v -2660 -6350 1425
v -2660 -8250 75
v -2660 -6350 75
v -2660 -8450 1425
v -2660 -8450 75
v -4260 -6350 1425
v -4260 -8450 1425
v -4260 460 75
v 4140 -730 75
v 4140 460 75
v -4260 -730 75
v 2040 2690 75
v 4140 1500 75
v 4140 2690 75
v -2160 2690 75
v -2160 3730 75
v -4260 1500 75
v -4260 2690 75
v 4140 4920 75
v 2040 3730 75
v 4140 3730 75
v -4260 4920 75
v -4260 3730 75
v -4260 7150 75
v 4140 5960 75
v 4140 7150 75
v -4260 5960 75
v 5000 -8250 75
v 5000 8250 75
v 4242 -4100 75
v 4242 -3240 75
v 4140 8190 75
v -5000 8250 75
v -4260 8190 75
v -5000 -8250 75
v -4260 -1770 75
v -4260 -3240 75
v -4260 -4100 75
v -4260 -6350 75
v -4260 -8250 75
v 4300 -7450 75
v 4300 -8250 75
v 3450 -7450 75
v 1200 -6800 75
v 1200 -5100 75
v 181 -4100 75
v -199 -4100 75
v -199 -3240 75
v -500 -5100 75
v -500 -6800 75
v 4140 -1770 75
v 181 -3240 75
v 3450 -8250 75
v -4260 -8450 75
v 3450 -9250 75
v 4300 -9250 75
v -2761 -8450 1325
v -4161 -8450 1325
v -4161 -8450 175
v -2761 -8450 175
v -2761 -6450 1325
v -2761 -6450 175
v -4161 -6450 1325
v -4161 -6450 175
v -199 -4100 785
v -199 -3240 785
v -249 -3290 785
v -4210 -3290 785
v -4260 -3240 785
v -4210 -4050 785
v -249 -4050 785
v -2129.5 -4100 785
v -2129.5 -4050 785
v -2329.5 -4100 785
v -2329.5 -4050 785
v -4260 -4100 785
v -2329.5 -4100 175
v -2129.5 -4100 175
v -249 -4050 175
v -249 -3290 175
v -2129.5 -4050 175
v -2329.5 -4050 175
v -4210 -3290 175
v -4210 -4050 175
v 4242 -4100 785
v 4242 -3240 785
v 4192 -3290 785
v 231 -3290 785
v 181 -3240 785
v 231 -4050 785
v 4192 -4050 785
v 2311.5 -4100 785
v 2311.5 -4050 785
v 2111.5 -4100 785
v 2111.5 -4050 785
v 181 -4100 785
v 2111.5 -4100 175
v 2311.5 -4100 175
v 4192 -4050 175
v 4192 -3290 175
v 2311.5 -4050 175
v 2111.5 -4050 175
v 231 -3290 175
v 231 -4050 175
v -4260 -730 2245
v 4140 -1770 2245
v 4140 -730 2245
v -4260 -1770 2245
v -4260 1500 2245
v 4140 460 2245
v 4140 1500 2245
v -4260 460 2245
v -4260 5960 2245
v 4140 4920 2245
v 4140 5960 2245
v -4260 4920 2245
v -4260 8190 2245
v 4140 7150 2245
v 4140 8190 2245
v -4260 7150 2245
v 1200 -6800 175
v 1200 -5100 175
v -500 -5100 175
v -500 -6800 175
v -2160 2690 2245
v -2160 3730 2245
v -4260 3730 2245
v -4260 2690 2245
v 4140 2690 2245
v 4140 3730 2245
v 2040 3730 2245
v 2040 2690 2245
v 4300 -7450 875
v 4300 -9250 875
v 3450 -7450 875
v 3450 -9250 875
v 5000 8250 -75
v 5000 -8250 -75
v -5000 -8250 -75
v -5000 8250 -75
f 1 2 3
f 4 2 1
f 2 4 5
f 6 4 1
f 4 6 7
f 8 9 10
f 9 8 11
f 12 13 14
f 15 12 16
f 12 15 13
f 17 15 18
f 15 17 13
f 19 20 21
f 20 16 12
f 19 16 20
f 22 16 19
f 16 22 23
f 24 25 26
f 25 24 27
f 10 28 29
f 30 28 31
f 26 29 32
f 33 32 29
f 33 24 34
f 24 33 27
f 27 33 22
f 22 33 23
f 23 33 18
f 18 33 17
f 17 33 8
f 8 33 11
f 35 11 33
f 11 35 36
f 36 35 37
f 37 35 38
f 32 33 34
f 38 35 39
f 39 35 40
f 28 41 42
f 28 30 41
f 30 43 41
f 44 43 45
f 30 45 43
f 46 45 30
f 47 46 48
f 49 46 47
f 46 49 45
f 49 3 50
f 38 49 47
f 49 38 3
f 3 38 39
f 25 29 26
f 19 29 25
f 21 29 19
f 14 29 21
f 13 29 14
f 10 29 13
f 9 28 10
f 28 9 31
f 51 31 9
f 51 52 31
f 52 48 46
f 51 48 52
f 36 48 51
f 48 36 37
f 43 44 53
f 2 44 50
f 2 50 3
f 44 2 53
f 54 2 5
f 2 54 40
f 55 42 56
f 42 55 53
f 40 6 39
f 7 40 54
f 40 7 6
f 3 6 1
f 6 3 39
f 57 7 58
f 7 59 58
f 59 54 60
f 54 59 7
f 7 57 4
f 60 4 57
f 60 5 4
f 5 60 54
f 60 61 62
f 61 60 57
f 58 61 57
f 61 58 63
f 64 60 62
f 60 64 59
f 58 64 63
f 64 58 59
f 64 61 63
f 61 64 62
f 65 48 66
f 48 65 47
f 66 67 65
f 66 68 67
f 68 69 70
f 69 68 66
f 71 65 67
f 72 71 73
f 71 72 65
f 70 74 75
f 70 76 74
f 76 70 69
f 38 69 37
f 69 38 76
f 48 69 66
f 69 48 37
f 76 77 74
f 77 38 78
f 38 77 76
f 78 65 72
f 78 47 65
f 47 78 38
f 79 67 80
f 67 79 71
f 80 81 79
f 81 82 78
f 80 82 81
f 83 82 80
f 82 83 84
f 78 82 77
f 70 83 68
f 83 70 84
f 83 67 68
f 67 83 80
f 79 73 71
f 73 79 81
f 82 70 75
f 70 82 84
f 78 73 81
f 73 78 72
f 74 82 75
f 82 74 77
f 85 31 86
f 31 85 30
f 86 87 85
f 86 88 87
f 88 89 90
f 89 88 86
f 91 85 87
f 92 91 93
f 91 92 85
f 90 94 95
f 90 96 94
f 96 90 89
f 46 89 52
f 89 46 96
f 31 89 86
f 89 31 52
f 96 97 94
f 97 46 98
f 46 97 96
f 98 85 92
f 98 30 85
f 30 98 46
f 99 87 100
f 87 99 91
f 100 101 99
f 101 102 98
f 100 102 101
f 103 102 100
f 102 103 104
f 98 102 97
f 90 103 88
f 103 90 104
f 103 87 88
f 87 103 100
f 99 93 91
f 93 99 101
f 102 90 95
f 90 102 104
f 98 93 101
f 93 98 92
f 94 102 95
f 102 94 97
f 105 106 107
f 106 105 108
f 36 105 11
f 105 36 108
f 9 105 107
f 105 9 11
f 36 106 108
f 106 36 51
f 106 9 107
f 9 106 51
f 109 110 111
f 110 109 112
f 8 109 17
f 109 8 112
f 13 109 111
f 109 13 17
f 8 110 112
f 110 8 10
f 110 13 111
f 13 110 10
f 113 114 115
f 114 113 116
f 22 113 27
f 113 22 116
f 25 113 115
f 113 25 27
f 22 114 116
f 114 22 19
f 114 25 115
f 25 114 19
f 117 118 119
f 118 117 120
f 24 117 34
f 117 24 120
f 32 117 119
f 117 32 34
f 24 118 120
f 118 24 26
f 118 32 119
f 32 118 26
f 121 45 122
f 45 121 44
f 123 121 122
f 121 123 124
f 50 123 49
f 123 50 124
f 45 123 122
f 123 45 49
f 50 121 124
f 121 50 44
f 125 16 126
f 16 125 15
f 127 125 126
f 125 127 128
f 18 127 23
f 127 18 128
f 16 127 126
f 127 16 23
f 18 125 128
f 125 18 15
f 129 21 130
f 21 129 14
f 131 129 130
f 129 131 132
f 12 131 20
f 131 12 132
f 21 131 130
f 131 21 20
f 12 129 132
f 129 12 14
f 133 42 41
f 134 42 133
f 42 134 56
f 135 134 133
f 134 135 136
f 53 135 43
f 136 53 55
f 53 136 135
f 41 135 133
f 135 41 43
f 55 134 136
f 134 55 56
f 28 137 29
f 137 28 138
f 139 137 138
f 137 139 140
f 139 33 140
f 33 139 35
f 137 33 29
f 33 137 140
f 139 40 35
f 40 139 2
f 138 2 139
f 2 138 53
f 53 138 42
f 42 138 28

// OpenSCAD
// file: Ports.scad
function W_RJ45() = 1600;

module Port_RJ45() {
  w = W_RJ45();
  l = 2100;
  h = 1350;

  difference() {
    cube([w, l, h]);
    translate([100 - 1, -100, 100]) cube([w - 200, l, h - 200]);
  }
}
// main file
use <Ports.scad>;

function W_MESA() = 10000;
function L_MESA() = 16500;
function H_MESA() = 3000;

module Mesa7i76e_Terminal(i, j, c="#ada") {
  w_terminal = 2100;
  l_terminal = 1040;
  h_terminal = 2170;
  o_terminal = 1190;

  translate([740 + j * w_terminal, 6480 + (l_terminal + o_terminal) * i, 0]) {
    color(c) cube([w_terminal, l_terminal, h_terminal]);
  }
}

module Mesa7i76e_Pins(w, l, h) {
  color("#666") {
    difference() {
      cube([w, l, h]);
      translate([50, 50, 100]) cube([w - 100, l - 100, h - 100 + 1]);

      w_cutout = 200;
      translate([(w - w_cutout)/2, -0.5, 100]) {
        cube([w_cutout, 50 + 1, h - 100 + 1]);
      }
    }
  }
}

module Mesa7i76e(w=W_MESA(), l=L_MESA()) {
  h_pcb = 150;

  color("#5c5") cube([w, l, h_pcb], center=true);
  translate([-w/2, -l/2, h_pcb/2]) {
    w_cpu = 1700;
    l_cpu = w_cpu;
    translate([4500, 1450, 0]) {
      color("#777") cube([w_cpu, l_cpu, 100]);
    }

    translate([740, -200, 0]) Port_RJ45();

    w_pins = 4061;
    l_pins = 860;
    h_pins = 710;

    translate([740, 4150, 0]) Mesa7i76e_Pins(w_pins, l_pins, h_pins);
    translate([740 + w_pins + 380, 4150, 0]) Mesa7i76e_Pins(w_pins, l_pins, h_pins);

    for (i = [0, 1, 3, 4]) {
      for (j = [0:3]) {
        Mesa7i76e_Terminal(i, j);
      }
    }

    Mesa7i76e_Terminal(2, 0, "orange");
    Mesa7i76e_Terminal(2, 3);

    translate([8450, -1000, 0]) color("#ada") cube([850, 1800, 800]);
  }
}

Mesa7i76e();
